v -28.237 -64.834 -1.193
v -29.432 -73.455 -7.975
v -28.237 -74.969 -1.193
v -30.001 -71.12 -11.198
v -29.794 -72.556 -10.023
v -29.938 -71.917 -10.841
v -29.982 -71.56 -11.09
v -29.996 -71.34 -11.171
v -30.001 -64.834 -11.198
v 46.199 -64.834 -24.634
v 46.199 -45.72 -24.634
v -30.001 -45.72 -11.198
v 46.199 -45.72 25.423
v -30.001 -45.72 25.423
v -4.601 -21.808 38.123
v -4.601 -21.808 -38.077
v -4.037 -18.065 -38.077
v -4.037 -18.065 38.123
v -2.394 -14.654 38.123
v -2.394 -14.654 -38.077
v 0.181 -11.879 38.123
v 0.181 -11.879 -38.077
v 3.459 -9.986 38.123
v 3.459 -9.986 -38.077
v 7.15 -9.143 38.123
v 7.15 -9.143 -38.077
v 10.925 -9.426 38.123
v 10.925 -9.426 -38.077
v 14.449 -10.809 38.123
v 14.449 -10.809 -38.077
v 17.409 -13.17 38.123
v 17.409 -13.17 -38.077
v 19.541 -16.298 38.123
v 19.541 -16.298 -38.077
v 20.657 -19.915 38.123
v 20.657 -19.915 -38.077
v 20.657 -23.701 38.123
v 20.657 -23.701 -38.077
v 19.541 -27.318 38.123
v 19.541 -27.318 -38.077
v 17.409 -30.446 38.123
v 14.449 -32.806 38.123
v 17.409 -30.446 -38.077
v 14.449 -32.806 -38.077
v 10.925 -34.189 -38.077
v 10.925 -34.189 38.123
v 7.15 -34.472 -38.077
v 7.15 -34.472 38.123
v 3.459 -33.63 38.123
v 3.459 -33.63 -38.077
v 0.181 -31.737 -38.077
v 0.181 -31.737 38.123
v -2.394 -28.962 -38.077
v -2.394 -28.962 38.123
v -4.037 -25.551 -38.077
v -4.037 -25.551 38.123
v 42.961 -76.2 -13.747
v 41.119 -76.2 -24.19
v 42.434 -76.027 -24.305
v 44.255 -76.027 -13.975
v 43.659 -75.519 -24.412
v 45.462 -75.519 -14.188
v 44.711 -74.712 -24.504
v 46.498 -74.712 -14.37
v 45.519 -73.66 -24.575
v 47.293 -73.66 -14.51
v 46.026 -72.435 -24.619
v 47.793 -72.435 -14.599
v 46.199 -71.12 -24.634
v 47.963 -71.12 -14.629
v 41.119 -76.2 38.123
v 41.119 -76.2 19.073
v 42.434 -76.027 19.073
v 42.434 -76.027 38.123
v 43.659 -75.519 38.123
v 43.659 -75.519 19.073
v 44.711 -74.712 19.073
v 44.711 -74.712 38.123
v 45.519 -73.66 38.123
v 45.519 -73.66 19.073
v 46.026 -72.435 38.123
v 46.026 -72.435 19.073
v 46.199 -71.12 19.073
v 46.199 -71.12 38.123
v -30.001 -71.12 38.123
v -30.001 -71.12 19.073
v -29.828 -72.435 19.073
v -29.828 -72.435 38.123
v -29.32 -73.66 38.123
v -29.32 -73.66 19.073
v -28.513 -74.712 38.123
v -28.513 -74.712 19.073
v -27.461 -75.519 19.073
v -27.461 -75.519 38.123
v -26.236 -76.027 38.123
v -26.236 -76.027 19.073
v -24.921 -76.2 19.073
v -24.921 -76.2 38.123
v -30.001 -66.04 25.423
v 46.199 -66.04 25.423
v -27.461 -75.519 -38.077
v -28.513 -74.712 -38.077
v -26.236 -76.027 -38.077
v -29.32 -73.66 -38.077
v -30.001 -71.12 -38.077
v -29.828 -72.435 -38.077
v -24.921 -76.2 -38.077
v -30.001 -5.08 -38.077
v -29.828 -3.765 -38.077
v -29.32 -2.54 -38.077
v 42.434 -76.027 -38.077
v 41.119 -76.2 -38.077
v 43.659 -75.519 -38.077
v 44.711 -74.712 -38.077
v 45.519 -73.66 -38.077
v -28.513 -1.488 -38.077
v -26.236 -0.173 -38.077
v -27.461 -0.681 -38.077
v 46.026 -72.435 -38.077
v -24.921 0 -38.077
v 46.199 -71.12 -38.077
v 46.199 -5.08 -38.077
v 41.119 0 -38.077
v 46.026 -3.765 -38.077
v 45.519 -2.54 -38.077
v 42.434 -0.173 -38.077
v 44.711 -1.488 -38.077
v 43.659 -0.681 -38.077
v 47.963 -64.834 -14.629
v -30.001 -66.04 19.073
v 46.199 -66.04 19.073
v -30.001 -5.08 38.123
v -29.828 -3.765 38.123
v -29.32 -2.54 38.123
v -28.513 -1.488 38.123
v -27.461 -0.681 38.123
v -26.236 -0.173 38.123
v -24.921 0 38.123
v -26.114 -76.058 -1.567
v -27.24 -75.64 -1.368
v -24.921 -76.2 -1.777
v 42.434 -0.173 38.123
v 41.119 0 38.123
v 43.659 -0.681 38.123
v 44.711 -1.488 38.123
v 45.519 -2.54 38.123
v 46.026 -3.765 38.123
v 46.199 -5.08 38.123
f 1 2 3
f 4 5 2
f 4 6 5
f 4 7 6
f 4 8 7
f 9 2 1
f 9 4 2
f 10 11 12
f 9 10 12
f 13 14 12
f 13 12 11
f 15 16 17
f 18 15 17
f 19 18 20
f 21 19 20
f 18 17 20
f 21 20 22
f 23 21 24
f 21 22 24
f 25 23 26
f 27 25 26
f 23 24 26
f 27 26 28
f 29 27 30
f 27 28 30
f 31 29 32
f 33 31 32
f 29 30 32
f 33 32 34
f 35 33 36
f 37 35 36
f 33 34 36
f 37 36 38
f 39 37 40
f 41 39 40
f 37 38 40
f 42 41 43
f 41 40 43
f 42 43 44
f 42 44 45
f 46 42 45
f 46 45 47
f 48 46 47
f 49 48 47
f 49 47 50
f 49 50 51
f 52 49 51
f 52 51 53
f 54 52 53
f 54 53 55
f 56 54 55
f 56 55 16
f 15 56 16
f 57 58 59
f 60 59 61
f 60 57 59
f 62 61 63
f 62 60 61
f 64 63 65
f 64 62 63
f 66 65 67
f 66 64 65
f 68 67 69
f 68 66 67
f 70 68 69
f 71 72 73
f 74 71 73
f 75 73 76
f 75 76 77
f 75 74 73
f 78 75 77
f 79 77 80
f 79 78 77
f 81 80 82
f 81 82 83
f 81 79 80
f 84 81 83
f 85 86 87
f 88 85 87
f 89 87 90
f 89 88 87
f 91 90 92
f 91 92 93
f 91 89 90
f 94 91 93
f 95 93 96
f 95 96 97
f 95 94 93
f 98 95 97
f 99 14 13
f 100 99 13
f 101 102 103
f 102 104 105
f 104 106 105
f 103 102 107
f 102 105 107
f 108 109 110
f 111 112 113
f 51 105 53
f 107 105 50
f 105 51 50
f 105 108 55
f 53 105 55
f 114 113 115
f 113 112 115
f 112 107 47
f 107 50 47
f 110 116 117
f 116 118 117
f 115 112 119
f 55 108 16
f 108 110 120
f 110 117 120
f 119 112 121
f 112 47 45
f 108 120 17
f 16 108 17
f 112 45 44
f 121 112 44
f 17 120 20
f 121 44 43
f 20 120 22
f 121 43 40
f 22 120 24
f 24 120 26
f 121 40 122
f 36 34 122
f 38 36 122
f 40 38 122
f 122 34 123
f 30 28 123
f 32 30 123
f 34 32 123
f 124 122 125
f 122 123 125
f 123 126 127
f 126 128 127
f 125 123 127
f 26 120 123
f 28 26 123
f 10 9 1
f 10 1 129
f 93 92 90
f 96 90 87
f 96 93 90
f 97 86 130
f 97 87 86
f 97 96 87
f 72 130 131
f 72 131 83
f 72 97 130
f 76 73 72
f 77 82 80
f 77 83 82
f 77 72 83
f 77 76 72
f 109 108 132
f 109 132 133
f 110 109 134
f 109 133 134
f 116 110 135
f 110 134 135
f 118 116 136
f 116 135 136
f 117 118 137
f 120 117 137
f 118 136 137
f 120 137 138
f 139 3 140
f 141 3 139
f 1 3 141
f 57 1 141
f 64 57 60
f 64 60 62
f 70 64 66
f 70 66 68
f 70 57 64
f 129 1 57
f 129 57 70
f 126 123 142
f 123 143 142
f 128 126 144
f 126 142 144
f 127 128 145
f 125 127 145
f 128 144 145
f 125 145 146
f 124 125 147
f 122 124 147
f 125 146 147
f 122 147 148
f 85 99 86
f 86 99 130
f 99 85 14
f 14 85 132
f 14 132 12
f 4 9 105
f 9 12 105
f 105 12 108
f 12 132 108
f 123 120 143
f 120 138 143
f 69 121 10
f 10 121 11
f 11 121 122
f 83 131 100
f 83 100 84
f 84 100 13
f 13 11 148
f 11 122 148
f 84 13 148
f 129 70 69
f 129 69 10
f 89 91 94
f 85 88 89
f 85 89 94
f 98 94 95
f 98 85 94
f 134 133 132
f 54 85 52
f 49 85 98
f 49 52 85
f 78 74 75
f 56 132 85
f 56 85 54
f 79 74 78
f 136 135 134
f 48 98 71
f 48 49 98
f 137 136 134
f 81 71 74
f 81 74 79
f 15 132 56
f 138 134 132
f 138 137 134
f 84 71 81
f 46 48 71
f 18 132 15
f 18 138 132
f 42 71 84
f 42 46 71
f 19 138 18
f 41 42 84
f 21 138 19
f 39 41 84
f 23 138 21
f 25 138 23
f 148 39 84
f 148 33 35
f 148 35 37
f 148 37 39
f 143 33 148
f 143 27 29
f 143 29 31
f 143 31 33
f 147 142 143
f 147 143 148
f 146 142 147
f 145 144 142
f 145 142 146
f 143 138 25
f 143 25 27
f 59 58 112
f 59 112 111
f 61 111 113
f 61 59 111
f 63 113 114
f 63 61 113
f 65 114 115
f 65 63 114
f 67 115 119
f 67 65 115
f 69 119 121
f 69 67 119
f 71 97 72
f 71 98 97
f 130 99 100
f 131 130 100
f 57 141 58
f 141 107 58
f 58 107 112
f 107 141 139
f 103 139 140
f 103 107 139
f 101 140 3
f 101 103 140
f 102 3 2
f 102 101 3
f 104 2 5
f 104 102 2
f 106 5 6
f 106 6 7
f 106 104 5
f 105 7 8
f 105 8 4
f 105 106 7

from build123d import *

# Parameters (mm, degrees)
F0_W     = 76.2
F0_H     = 76.2
F1_DEPTH = 45.72
F2_W     = 76.2
F2_H     = 12.7
F3_DEPTH = 30.48
F4_W     = 76.2
F4_H     = 10.16
F5_DEPTH = 6.35
F7_DEPTH = 30.48
F8_W     = 77.3755078257
F8_H     = 11.3661354303
F9_DEPTH = 10.16
F10_R    = 5.08
F12_D    = 25.4


with BuildPart() as f1:
    # F0 (on Front) → F1 (new body)
    with BuildSketch(Plane.XZ):
        with Locations((8.099174127, 0.0226207582)):
            Rectangle(F0_W, F0_H)
    extrude(amount=F1_DEPTH)

    # F2 (on face) → F3 (join)
    with BuildSketch(Plane.XZ.offset(45.72)):
        with Locations((8.099174127, 31.7726207582)):
            Rectangle(F2_W, F2_H)
    extrude(amount=F3_DEPTH)

    # F4 (on face) → F5 (join)
    with BuildSketch(Plane(origin=(0, 0, 25.4226207582), x_dir=(1, 0, 0), z_dir=(0, 0, -1))):
        with Locations((8.099174127, 71.12)):
            Rectangle(F4_W, F4_H)
    extrude(amount=F5_DEPTH)

    # F6 (on face) → F7 (join)
    with BuildSketch(Plane.XZ.offset(45.72)):
        Polygon((-30.000825873, -11.1981863156), (-30.000825873, -38.0773792418), (46.199174127, -38.0773792418), (46.199174127, -24.6343022456), align=None)
    extrude(amount=F7_DEPTH)

    # F8 (on face) → F9 (join)
    with BuildSketch(Plane(origin=(-2.8196382357, 0, -15.9909630638), x_dir=(0.984807753, 0, -0.1736481777), z_dir=(0.1736481777, 0, 0.984807753))):
        with Locations((11.0872526432, -70.5169322848)):
            Rectangle(F8_W, F8_H)
    extrude(amount=F9_DEPTH)

    # F10
    f10_edges = [f1.edges().sort_by_distance(p)[0] for p in [
        (-30.000826, -76.2, 28.597621),
        (-30.000826, -76.2, -24.637783),
        (46.199174, -76.2, -31.355841),
        (47.081307, -76.2, -19.631479),
        (46.199174, -76.2, 28.597621),
        (46.199174, 0, 0.022621),
        (-30.000826, 0, 0.022621),
    ]]
    fillet(f10_edges, radius=F10_R)

    # F12 (through all)
    with Locations(Plane.XY.offset(38.1226207582)):
        with Locations((8.099174127, -21.8078975493)):
            Hole(F12_D / 2)


solid = f1.part
